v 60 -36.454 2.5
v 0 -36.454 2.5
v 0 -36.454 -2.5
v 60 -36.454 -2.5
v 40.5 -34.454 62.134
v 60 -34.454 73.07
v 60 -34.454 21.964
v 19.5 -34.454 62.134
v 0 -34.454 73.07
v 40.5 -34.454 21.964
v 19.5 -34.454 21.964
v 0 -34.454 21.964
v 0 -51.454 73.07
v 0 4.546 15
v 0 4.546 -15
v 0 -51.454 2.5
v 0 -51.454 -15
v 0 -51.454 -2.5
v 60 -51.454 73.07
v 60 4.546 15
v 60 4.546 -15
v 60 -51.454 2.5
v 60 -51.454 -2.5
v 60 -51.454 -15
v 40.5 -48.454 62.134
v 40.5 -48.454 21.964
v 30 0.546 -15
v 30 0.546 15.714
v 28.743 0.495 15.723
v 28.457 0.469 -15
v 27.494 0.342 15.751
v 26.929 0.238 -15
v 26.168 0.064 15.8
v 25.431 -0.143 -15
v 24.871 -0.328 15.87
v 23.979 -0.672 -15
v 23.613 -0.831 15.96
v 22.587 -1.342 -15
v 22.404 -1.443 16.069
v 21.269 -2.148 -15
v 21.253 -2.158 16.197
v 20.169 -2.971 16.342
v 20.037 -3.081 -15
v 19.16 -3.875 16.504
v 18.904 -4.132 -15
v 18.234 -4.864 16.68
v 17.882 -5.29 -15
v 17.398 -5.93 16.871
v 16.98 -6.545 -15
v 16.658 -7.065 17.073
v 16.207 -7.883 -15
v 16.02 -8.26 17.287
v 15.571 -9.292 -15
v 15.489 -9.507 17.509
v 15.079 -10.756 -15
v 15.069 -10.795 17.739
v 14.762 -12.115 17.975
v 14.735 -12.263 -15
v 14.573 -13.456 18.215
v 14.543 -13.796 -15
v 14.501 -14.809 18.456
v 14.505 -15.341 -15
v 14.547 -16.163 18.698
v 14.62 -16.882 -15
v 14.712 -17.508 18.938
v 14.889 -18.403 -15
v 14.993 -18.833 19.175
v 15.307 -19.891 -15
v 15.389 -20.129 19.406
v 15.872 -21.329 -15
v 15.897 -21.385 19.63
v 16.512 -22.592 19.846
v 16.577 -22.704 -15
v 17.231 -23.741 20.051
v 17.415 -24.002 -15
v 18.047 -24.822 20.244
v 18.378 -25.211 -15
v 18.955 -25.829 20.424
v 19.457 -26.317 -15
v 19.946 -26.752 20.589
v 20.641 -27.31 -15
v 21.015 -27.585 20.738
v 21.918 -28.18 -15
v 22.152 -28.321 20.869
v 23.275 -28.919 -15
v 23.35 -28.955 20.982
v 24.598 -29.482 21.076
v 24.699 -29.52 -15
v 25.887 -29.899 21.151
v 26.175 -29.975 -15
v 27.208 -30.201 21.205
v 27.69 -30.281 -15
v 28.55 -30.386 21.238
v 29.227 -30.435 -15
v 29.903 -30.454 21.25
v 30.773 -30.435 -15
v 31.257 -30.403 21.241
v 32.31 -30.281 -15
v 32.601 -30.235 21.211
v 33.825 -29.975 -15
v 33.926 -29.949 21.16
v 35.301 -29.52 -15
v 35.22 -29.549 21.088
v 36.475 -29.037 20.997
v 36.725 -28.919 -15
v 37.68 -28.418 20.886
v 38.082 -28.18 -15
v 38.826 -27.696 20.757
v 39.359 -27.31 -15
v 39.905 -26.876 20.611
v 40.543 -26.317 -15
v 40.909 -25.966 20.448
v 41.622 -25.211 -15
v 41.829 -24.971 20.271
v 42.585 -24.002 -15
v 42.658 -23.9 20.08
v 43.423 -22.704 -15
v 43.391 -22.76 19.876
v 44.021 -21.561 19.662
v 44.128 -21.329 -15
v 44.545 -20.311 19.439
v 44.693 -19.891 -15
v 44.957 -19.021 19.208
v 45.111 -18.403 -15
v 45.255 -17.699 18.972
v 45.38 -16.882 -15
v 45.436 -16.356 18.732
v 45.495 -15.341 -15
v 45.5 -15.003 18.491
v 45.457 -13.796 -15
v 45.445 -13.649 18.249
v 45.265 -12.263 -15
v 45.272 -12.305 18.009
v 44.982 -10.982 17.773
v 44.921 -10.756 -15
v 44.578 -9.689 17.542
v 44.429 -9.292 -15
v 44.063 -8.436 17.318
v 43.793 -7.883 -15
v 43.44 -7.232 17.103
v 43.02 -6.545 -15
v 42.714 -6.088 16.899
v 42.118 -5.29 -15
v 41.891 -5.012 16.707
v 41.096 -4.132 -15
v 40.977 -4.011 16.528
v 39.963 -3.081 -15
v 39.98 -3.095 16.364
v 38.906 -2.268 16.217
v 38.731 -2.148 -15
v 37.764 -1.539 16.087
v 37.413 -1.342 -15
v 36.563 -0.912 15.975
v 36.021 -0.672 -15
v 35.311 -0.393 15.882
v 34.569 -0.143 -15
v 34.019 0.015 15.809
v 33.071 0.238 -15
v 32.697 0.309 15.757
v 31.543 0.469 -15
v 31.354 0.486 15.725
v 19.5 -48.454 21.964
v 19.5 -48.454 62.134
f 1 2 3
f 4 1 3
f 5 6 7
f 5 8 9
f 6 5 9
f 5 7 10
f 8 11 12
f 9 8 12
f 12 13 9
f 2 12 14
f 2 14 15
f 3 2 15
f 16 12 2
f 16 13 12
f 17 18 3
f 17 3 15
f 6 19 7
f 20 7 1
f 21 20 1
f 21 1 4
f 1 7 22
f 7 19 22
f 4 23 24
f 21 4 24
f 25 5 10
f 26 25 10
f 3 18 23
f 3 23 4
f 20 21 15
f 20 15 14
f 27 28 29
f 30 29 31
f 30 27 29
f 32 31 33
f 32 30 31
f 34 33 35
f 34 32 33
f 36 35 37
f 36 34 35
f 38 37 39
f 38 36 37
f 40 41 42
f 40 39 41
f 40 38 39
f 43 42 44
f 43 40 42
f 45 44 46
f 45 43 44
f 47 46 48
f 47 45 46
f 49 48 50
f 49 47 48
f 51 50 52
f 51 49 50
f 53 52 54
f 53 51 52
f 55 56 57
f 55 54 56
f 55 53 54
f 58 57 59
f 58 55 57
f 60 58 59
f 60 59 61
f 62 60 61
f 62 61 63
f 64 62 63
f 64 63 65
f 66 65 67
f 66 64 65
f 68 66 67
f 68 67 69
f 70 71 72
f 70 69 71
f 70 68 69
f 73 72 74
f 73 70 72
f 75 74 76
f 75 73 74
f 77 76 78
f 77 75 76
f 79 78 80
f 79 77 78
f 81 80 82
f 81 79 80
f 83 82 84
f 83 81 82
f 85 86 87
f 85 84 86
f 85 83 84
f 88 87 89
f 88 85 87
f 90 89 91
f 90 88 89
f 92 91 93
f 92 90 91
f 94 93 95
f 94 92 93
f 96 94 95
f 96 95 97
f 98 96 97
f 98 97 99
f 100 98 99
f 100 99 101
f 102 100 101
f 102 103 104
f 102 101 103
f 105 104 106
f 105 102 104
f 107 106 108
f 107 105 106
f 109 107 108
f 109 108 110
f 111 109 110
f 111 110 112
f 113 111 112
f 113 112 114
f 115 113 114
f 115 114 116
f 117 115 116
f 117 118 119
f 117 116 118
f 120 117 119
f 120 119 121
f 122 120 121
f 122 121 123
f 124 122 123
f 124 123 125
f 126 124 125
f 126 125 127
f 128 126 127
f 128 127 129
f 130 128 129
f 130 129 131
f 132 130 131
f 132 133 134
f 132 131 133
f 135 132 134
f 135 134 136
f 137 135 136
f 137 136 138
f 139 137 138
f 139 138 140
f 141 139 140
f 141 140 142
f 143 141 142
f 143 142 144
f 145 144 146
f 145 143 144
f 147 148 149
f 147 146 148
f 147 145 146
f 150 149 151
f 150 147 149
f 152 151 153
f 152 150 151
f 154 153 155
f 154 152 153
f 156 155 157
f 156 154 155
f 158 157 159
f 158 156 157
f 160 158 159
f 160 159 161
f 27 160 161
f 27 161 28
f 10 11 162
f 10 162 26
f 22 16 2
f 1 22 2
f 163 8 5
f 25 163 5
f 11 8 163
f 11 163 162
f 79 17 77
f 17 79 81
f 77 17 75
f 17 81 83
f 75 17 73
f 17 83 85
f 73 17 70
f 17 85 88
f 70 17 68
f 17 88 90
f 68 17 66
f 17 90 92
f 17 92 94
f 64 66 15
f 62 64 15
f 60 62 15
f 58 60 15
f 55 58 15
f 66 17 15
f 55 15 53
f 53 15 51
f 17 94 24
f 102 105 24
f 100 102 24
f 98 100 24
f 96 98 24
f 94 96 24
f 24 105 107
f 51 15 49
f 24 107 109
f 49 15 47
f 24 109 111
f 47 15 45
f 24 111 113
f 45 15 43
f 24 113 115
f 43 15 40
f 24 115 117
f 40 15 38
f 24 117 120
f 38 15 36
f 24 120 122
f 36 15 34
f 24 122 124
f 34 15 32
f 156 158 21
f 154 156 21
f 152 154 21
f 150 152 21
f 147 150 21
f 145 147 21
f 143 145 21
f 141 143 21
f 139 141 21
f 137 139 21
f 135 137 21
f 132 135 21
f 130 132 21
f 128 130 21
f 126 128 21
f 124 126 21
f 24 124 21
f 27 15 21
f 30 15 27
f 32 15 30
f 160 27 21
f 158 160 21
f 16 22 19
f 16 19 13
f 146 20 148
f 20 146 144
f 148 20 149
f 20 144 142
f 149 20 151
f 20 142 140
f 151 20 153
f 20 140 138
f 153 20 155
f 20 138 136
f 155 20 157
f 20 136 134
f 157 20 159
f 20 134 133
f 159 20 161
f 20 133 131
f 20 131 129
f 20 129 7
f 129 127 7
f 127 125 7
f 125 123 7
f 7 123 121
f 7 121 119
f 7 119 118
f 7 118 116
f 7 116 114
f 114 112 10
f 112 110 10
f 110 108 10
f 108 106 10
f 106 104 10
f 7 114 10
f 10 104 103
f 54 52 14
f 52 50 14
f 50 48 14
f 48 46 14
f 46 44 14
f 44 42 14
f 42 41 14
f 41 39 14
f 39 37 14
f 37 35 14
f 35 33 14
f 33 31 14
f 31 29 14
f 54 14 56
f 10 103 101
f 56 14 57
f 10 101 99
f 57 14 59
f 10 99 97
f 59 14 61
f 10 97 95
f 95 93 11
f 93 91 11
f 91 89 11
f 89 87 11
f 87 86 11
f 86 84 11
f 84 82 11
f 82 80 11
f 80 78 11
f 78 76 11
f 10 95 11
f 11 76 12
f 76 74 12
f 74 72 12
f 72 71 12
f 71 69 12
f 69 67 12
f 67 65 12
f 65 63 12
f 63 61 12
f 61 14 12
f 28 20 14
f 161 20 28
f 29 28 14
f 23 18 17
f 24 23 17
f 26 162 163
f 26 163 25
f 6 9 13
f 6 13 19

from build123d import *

# Parameters (mm, degrees)
EXTRUDE_1_DEPTH          = 60
CUT_EXTRUDE_1_DEPTH      = 40
CUT_EXTRUDE_1_DEPTH_BACK = 29
SKETCH_4_R               = 15.5
SKETCH_5_W               = 5
SKETCH_5_H               = 30
CUT_EXTRUDE_2_DEPTH      = 83.900874001
SKETCH_7_W               = 60
SKETCH_7_H               = 85.424918669
EXTRUDE_2_DEPTH          = 17
CUT_EXTRUDE_START        = -34.454396
SKETCH_9_W               = 21
SKETCH_9_H               = 40.17
CUT_EXTRUDE_3_DEPTH      = 14
SKETCH_12_W              = 60
SKETCH_12_H              = 16.92976669
CUT_EXTRUDE_4_DEPTH      = 120.781279465
CUT_EXTRUDE_START_2      = -15
SKETCH_14_W              = 60
SKETCH_14_H              = 56
CUT_EXTRUDE_8_DEPTH      = 10


with BuildPart() as part:
    # 스케치3 → 보스-돌출1 (new body)
    with BuildSketch(Plane(origin=(0, 0, 0), x_dir=(0, 0, -1), z_dir=(1, 0, 0))):
        Polygon((-25, -51.454396413), (25, -51.454396413), (15, 4.545603587), (-15, 4.545603587), align=None)
    extrude(amount=EXTRUDE_1_DEPTH)

    # 스케치4 → 컷-돌출1 (cut, two sides: drawn at the far end of the back side and taken through both)
    with BuildSketch(Plane.XY.offset(-CUT_EXTRUDE_1_DEPTH_BACK)):
        with Locations(Location((30, -14.954396413, 0), (0, 0, 90))):
            Circle(SKETCH_4_R)
    extrude(amount=CUT_EXTRUDE_1_DEPTH + CUT_EXTRUDE_1_DEPTH_BACK, mode=Mode.SUBTRACT)

    # 스케치5 → 컷-돌출2 (cut, through all)
    with BuildSketch(Plane(origin=(0, 0, 0), x_dir=(0, 0, -1), z_dir=(1, 0, 0))):
        with Locations((0, -51.454396413)):
            Rectangle(SKETCH_5_W, SKETCH_5_H)
    extrude(amount=CUT_EXTRUDE_2_DEPTH, mode=Mode.SUBTRACT)

    # 스케치7 → 보스-돌출2 (add)
    with BuildSketch(Plane(origin=(0, -51.454396413, 0), x_dir=(-1, 0, 0), z_dir=(0, -1, 0))):
        with Locations((-30, -47.287540666)):
            Rectangle(SKETCH_7_W, SKETCH_7_H)
    extrude(amount=-EXTRUDE_2_DEPTH)

    # 스케치9 → 컷-돌출3 (cut)
    with BuildSketch(Plane(origin=(0, 0, 0), x_dir=(1, 0, 0), z_dir=(0, 1, 0)).offset(CUT_EXTRUDE_START)):
        with Locations((30, -42.049285714)):
            Rectangle(SKETCH_9_W, SKETCH_9_H)
    extrude(amount=-CUT_EXTRUDE_3_DEPTH, mode=Mode.SUBTRACT)

    # 스케치12 → 컷-돌출4 (cut, through all)
    with BuildSketch(Plane(origin=(0, 0, 0), x_dir=(1, 0, 0), z_dir=(0, 1, 0))):
        with Locations((30, -81.535116655)):
            Rectangle(SKETCH_12_W, SKETCH_12_H)
    extrude(amount=-CUT_EXTRUDE_4_DEPTH, mode=Mode.SUBTRACT)

    # 스케치14 → 컷-돌출8 (cut)
    with BuildSketch(Plane.XY.offset(CUT_EXTRUDE_START_2)):
        with Locations((30, -23.454396413)):
            Rectangle(SKETCH_14_W, SKETCH_14_H)
    extrude(amount=-CUT_EXTRUDE_8_DEPTH, mode=Mode.SUBTRACT)


solid = part.part
